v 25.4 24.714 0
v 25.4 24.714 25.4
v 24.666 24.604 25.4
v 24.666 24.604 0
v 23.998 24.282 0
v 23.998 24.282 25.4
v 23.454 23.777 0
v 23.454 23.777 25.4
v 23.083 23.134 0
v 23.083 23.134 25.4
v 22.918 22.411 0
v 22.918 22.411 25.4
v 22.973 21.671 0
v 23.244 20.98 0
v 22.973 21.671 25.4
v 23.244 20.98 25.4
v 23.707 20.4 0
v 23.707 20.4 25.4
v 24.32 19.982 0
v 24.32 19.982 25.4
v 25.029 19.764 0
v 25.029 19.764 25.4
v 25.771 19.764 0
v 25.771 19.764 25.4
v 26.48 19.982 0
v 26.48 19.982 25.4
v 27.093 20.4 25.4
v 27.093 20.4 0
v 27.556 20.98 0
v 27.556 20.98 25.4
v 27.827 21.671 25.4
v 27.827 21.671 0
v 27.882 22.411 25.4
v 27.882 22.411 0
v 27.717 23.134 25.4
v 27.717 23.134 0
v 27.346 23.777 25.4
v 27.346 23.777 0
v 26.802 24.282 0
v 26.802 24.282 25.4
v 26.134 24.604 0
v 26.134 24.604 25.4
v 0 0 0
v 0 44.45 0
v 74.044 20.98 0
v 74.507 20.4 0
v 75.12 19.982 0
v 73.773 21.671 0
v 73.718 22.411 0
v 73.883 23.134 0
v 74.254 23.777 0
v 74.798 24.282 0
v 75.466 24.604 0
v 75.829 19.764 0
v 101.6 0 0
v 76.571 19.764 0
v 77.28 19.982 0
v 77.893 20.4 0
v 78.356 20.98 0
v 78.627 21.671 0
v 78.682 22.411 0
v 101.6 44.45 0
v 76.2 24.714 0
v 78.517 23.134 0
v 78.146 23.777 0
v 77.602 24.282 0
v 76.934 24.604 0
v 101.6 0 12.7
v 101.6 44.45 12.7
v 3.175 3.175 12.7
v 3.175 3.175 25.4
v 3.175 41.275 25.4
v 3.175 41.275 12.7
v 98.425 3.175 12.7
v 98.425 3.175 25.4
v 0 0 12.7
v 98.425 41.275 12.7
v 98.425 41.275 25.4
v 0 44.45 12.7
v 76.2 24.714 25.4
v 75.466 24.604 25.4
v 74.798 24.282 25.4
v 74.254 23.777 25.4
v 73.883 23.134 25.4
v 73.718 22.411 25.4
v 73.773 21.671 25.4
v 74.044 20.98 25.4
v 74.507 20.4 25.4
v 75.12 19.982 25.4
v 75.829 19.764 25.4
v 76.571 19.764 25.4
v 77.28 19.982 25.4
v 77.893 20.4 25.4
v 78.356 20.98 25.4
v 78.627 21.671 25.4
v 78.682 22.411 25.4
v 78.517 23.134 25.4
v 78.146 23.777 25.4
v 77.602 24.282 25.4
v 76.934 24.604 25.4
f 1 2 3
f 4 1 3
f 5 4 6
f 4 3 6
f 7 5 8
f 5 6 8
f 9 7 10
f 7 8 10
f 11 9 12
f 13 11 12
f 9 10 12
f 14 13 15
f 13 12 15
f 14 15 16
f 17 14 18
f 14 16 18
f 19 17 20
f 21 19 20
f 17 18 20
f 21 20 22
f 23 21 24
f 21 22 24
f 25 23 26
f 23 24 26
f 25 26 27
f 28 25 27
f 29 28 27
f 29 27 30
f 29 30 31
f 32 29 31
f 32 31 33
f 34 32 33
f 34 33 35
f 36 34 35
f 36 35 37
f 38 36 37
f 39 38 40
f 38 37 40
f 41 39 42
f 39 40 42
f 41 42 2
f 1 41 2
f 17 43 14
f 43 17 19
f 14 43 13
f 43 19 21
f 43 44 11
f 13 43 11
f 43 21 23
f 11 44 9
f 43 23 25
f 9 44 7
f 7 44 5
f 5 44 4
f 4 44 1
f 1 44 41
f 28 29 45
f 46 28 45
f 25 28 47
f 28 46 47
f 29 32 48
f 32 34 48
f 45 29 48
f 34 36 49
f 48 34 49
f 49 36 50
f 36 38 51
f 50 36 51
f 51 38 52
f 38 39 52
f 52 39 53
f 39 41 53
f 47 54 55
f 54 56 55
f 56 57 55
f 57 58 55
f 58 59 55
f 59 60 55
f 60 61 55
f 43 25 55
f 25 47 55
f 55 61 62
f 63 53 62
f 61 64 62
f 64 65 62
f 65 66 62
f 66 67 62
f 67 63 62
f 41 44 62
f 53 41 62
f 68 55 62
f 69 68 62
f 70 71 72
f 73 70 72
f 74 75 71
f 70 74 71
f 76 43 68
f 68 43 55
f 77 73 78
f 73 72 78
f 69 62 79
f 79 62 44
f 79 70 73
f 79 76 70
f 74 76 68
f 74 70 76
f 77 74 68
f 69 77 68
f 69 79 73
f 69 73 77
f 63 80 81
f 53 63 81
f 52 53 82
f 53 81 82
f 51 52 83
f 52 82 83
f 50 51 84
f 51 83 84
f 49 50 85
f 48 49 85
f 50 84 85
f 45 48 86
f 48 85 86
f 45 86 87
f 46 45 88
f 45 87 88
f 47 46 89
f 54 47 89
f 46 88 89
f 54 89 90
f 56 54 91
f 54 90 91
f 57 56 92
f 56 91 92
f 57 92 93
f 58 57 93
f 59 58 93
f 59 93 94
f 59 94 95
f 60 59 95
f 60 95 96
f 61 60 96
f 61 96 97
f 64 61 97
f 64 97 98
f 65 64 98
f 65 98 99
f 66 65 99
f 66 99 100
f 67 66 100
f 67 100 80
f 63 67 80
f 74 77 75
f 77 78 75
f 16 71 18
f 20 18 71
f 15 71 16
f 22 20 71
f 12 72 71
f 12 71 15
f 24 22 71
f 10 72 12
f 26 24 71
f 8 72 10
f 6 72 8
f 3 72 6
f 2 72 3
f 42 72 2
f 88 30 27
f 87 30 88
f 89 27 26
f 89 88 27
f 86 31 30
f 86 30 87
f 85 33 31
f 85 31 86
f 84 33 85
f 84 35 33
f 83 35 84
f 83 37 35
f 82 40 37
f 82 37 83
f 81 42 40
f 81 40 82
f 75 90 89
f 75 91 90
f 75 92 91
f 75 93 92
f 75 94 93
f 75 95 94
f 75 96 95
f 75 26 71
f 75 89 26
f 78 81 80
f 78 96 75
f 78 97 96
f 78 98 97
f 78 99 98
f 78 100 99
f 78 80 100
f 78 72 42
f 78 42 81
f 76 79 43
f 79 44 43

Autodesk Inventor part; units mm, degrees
ref_plane "YZ Plane" through (0, 0, 0) normal (1, 0, 0) x (0, 1, 0)
ref_plane "XZ Plane" through (0, 0, 0) normal (0, 1, 0) x (-1, 0, 0)
ref_plane "XY Plane" through (0, 0, 0) normal (0, 0, 1) x (1, 0, 0)
sketch "Sketch1" plane through (0, 0, 0) normal (0, 0, 1) x (1, 0, 0)
  line L0 (0, 0) -> (101.6, 0)
  line L1 (101.6, 0) -> (101.6, 44.45)
  line L2 (101.6, 44.45) -> (0, 44.45)
  line L3 (0, 44.45) -> (0, 0)
  dimension "d0" = 101.6
  dimension "d1" = 44.45
extrude "Extrusion1" add sketch "Sketch1" along normal blind 25.4
sketch "Sketch2" plane through (0, 0, 25.4) normal (0, 0, 1) x (1, 0, 0)
  line L0 (0, 0) -> (101.6, 0) projected
  line L1 (101.6, 0) -> (101.6, 44.45) projected
  line L2 (101.6, 44.45) -> (0, 44.45) projected
  line L3 (0, 44.45) -> (0, 0) projected
  line L4 (3.175, 41.275) -> (98.425, 41.275)
  line L5 (98.425, 41.275) -> (98.425, 3.175)
  line L6 (98.425, 3.175) -> (3.175, 3.175)
  line L7 (3.175, 3.175) -> (3.175, 41.275)
  dimension "d4" = 3.175
extrude "Extrusion2" cut sketch "Sketch2" against normal blind 12.7
sketch "Sketch3" plane through (0, 0, 0) normal (0, 0, -1) x (-1, 0, 0)
  line L0 (0, 44.45) -> (0, 0) projected
  line L1 (-101.6, 44.45) -> (0, 44.45) projected
  line L2 (-101.6, 0) -> (-101.6, 44.45) projected
  point P0 (-76.2, 22.225)
  point P1 (-25.4, 22.225)
  dimension "d7" = 50.8
  dimension "d8" = 25.4
  dimension "d9" = 25.4
  dimension "d10" = 22.225
hole "Hole1" at (76.2, 22.225, 0) at (25.4, 22.225, 0) direction (0, 0, 1) diameter 4.9784 end through all thread size "1/4-20 UNC" class "2B" standard "ANSI Unified Screw Threads"
properties part number "Endcaps"
